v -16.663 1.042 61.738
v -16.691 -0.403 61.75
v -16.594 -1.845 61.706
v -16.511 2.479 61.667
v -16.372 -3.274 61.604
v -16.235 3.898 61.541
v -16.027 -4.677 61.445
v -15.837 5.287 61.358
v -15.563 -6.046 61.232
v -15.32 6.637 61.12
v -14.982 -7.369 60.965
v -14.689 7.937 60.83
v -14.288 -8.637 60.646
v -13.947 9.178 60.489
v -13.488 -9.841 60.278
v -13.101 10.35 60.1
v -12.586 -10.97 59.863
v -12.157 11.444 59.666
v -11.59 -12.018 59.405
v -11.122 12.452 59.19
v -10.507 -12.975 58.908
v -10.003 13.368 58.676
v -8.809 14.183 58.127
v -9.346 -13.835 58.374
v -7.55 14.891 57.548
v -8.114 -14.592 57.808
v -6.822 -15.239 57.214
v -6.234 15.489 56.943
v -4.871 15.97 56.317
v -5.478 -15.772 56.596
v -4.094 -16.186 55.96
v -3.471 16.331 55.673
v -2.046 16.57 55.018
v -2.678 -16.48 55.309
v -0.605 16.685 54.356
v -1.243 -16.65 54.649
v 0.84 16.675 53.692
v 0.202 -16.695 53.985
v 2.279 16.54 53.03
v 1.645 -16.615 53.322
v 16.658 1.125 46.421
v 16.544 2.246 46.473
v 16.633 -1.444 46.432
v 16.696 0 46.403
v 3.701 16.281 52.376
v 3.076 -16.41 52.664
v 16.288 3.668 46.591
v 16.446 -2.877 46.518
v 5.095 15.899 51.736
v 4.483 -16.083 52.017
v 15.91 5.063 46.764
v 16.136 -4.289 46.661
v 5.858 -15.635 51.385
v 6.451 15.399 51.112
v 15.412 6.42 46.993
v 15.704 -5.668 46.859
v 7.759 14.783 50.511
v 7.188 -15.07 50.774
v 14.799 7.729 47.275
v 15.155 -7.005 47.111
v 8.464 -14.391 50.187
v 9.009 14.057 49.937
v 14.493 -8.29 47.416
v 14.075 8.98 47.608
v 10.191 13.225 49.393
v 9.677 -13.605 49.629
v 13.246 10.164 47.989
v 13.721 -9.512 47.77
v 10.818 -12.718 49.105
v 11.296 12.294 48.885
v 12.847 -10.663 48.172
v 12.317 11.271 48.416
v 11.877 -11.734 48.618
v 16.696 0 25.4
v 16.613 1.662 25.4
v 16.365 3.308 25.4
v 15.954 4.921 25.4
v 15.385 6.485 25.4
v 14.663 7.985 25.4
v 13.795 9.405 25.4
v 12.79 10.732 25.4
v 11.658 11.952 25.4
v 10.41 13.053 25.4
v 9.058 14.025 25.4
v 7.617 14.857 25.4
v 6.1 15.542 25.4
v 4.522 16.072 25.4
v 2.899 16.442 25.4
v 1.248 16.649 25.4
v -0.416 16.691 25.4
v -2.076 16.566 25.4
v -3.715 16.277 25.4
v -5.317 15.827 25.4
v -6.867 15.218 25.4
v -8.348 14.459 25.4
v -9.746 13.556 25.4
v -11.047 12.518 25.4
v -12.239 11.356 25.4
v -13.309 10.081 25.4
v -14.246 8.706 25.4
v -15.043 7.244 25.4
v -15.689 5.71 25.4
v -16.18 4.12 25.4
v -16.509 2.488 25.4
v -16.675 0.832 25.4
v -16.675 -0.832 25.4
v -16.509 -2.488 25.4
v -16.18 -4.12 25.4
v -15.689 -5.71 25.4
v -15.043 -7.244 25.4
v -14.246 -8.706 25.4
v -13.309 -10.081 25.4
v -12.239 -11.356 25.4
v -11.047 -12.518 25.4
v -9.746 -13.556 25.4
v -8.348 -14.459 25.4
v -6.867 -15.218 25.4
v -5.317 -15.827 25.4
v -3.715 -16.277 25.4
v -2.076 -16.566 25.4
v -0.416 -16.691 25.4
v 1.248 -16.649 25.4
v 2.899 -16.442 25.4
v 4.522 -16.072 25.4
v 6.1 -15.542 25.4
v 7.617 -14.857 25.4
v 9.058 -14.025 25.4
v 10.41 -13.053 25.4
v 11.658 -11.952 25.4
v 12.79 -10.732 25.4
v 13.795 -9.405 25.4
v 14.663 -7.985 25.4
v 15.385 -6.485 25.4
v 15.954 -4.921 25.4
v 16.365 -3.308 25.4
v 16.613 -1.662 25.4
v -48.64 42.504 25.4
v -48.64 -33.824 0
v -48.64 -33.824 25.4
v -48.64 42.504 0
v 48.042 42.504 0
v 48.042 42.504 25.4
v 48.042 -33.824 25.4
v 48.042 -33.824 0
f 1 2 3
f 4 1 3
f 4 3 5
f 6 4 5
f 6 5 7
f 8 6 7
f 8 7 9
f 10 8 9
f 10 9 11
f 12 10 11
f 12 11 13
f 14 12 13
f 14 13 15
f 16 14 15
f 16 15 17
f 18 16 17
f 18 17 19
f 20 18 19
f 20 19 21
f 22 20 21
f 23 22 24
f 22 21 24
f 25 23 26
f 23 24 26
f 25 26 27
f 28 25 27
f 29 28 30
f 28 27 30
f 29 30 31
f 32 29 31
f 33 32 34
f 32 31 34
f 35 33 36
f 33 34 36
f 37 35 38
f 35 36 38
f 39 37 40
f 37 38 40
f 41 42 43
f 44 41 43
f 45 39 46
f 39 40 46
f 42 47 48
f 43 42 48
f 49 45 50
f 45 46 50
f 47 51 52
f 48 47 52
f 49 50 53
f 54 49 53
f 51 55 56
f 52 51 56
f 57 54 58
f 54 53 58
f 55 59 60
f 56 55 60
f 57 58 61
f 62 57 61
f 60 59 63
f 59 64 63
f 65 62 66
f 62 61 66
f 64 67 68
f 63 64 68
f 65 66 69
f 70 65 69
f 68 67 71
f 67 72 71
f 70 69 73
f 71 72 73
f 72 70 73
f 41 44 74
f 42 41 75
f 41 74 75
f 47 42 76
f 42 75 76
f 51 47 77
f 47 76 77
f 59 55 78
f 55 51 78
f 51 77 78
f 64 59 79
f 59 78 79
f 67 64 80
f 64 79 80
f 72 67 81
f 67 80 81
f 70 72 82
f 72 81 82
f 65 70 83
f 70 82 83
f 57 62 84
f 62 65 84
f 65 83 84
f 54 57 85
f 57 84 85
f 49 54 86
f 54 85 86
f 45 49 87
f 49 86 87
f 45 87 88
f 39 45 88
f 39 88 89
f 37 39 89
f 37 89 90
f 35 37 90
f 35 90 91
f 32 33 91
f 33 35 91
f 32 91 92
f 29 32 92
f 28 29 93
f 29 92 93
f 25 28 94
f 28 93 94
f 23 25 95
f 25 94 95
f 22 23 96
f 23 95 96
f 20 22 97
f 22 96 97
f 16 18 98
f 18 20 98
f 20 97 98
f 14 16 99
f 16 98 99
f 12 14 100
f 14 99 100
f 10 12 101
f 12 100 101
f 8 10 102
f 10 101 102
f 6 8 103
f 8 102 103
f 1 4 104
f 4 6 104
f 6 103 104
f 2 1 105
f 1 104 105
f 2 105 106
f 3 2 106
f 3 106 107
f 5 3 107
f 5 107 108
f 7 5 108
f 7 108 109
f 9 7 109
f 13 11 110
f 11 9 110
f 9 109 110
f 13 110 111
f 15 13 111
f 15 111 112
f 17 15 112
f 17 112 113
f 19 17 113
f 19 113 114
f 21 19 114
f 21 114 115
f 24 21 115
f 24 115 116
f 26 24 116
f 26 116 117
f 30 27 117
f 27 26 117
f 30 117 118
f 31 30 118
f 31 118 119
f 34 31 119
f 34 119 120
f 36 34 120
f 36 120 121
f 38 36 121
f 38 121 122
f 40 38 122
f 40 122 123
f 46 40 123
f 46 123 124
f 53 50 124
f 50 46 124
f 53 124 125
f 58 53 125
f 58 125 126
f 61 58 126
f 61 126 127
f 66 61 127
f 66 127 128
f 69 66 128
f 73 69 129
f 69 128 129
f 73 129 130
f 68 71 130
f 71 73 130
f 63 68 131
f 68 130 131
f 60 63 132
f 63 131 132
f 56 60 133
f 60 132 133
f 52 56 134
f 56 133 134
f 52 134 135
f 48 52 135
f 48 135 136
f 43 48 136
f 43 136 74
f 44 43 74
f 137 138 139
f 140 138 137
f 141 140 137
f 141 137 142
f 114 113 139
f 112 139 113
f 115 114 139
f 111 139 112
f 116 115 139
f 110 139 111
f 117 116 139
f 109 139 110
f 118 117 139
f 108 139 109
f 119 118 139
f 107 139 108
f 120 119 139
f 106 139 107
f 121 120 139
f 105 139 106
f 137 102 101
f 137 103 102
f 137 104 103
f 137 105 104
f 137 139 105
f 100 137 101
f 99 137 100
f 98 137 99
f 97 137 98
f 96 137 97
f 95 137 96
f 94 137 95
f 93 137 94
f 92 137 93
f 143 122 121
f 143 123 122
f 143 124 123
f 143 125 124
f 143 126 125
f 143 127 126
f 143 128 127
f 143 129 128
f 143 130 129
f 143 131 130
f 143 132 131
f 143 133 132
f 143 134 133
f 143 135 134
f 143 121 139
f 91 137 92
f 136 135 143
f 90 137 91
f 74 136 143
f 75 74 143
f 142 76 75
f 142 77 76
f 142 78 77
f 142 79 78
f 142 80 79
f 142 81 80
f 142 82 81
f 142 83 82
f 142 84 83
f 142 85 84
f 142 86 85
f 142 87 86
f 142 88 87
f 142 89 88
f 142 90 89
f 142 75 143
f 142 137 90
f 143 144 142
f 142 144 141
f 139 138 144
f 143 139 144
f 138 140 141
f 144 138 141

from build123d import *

# Parameters (mm, degrees)
F0_W     = 96.682288
F0_H     = 76.328121
F1_DEPTH = 25.4
F2_R     = 16.695936
F3_DEPTH = 38.1
F5_DEPTH = 38.1


with BuildPart() as f1:
    # F0 (on Top) → F1 (new body)
    with BuildSketch(Plane.XY):
        with Locations((-0.299327, 4.340227)):
            Rectangle(F0_W, F0_H)
    extrude(amount=F1_DEPTH)

    # F2 (on face) → F3 (join)
    with BuildSketch(Plane.XY.offset(25.4)):
        Circle(F2_R)
    extrude(amount=F3_DEPTH)

    # F4 (on Front) → F5 (cut, symmetric)
    with BuildSketch(Plane.XZ):
        Polygon((41.456647, 69.144301), (-32.776196, 69.144301), (41.456647, 35.021137), align=None)
    extrude(amount=F5_DEPTH, both=True, mode=Mode.SUBTRACT)


solid = f1.part
